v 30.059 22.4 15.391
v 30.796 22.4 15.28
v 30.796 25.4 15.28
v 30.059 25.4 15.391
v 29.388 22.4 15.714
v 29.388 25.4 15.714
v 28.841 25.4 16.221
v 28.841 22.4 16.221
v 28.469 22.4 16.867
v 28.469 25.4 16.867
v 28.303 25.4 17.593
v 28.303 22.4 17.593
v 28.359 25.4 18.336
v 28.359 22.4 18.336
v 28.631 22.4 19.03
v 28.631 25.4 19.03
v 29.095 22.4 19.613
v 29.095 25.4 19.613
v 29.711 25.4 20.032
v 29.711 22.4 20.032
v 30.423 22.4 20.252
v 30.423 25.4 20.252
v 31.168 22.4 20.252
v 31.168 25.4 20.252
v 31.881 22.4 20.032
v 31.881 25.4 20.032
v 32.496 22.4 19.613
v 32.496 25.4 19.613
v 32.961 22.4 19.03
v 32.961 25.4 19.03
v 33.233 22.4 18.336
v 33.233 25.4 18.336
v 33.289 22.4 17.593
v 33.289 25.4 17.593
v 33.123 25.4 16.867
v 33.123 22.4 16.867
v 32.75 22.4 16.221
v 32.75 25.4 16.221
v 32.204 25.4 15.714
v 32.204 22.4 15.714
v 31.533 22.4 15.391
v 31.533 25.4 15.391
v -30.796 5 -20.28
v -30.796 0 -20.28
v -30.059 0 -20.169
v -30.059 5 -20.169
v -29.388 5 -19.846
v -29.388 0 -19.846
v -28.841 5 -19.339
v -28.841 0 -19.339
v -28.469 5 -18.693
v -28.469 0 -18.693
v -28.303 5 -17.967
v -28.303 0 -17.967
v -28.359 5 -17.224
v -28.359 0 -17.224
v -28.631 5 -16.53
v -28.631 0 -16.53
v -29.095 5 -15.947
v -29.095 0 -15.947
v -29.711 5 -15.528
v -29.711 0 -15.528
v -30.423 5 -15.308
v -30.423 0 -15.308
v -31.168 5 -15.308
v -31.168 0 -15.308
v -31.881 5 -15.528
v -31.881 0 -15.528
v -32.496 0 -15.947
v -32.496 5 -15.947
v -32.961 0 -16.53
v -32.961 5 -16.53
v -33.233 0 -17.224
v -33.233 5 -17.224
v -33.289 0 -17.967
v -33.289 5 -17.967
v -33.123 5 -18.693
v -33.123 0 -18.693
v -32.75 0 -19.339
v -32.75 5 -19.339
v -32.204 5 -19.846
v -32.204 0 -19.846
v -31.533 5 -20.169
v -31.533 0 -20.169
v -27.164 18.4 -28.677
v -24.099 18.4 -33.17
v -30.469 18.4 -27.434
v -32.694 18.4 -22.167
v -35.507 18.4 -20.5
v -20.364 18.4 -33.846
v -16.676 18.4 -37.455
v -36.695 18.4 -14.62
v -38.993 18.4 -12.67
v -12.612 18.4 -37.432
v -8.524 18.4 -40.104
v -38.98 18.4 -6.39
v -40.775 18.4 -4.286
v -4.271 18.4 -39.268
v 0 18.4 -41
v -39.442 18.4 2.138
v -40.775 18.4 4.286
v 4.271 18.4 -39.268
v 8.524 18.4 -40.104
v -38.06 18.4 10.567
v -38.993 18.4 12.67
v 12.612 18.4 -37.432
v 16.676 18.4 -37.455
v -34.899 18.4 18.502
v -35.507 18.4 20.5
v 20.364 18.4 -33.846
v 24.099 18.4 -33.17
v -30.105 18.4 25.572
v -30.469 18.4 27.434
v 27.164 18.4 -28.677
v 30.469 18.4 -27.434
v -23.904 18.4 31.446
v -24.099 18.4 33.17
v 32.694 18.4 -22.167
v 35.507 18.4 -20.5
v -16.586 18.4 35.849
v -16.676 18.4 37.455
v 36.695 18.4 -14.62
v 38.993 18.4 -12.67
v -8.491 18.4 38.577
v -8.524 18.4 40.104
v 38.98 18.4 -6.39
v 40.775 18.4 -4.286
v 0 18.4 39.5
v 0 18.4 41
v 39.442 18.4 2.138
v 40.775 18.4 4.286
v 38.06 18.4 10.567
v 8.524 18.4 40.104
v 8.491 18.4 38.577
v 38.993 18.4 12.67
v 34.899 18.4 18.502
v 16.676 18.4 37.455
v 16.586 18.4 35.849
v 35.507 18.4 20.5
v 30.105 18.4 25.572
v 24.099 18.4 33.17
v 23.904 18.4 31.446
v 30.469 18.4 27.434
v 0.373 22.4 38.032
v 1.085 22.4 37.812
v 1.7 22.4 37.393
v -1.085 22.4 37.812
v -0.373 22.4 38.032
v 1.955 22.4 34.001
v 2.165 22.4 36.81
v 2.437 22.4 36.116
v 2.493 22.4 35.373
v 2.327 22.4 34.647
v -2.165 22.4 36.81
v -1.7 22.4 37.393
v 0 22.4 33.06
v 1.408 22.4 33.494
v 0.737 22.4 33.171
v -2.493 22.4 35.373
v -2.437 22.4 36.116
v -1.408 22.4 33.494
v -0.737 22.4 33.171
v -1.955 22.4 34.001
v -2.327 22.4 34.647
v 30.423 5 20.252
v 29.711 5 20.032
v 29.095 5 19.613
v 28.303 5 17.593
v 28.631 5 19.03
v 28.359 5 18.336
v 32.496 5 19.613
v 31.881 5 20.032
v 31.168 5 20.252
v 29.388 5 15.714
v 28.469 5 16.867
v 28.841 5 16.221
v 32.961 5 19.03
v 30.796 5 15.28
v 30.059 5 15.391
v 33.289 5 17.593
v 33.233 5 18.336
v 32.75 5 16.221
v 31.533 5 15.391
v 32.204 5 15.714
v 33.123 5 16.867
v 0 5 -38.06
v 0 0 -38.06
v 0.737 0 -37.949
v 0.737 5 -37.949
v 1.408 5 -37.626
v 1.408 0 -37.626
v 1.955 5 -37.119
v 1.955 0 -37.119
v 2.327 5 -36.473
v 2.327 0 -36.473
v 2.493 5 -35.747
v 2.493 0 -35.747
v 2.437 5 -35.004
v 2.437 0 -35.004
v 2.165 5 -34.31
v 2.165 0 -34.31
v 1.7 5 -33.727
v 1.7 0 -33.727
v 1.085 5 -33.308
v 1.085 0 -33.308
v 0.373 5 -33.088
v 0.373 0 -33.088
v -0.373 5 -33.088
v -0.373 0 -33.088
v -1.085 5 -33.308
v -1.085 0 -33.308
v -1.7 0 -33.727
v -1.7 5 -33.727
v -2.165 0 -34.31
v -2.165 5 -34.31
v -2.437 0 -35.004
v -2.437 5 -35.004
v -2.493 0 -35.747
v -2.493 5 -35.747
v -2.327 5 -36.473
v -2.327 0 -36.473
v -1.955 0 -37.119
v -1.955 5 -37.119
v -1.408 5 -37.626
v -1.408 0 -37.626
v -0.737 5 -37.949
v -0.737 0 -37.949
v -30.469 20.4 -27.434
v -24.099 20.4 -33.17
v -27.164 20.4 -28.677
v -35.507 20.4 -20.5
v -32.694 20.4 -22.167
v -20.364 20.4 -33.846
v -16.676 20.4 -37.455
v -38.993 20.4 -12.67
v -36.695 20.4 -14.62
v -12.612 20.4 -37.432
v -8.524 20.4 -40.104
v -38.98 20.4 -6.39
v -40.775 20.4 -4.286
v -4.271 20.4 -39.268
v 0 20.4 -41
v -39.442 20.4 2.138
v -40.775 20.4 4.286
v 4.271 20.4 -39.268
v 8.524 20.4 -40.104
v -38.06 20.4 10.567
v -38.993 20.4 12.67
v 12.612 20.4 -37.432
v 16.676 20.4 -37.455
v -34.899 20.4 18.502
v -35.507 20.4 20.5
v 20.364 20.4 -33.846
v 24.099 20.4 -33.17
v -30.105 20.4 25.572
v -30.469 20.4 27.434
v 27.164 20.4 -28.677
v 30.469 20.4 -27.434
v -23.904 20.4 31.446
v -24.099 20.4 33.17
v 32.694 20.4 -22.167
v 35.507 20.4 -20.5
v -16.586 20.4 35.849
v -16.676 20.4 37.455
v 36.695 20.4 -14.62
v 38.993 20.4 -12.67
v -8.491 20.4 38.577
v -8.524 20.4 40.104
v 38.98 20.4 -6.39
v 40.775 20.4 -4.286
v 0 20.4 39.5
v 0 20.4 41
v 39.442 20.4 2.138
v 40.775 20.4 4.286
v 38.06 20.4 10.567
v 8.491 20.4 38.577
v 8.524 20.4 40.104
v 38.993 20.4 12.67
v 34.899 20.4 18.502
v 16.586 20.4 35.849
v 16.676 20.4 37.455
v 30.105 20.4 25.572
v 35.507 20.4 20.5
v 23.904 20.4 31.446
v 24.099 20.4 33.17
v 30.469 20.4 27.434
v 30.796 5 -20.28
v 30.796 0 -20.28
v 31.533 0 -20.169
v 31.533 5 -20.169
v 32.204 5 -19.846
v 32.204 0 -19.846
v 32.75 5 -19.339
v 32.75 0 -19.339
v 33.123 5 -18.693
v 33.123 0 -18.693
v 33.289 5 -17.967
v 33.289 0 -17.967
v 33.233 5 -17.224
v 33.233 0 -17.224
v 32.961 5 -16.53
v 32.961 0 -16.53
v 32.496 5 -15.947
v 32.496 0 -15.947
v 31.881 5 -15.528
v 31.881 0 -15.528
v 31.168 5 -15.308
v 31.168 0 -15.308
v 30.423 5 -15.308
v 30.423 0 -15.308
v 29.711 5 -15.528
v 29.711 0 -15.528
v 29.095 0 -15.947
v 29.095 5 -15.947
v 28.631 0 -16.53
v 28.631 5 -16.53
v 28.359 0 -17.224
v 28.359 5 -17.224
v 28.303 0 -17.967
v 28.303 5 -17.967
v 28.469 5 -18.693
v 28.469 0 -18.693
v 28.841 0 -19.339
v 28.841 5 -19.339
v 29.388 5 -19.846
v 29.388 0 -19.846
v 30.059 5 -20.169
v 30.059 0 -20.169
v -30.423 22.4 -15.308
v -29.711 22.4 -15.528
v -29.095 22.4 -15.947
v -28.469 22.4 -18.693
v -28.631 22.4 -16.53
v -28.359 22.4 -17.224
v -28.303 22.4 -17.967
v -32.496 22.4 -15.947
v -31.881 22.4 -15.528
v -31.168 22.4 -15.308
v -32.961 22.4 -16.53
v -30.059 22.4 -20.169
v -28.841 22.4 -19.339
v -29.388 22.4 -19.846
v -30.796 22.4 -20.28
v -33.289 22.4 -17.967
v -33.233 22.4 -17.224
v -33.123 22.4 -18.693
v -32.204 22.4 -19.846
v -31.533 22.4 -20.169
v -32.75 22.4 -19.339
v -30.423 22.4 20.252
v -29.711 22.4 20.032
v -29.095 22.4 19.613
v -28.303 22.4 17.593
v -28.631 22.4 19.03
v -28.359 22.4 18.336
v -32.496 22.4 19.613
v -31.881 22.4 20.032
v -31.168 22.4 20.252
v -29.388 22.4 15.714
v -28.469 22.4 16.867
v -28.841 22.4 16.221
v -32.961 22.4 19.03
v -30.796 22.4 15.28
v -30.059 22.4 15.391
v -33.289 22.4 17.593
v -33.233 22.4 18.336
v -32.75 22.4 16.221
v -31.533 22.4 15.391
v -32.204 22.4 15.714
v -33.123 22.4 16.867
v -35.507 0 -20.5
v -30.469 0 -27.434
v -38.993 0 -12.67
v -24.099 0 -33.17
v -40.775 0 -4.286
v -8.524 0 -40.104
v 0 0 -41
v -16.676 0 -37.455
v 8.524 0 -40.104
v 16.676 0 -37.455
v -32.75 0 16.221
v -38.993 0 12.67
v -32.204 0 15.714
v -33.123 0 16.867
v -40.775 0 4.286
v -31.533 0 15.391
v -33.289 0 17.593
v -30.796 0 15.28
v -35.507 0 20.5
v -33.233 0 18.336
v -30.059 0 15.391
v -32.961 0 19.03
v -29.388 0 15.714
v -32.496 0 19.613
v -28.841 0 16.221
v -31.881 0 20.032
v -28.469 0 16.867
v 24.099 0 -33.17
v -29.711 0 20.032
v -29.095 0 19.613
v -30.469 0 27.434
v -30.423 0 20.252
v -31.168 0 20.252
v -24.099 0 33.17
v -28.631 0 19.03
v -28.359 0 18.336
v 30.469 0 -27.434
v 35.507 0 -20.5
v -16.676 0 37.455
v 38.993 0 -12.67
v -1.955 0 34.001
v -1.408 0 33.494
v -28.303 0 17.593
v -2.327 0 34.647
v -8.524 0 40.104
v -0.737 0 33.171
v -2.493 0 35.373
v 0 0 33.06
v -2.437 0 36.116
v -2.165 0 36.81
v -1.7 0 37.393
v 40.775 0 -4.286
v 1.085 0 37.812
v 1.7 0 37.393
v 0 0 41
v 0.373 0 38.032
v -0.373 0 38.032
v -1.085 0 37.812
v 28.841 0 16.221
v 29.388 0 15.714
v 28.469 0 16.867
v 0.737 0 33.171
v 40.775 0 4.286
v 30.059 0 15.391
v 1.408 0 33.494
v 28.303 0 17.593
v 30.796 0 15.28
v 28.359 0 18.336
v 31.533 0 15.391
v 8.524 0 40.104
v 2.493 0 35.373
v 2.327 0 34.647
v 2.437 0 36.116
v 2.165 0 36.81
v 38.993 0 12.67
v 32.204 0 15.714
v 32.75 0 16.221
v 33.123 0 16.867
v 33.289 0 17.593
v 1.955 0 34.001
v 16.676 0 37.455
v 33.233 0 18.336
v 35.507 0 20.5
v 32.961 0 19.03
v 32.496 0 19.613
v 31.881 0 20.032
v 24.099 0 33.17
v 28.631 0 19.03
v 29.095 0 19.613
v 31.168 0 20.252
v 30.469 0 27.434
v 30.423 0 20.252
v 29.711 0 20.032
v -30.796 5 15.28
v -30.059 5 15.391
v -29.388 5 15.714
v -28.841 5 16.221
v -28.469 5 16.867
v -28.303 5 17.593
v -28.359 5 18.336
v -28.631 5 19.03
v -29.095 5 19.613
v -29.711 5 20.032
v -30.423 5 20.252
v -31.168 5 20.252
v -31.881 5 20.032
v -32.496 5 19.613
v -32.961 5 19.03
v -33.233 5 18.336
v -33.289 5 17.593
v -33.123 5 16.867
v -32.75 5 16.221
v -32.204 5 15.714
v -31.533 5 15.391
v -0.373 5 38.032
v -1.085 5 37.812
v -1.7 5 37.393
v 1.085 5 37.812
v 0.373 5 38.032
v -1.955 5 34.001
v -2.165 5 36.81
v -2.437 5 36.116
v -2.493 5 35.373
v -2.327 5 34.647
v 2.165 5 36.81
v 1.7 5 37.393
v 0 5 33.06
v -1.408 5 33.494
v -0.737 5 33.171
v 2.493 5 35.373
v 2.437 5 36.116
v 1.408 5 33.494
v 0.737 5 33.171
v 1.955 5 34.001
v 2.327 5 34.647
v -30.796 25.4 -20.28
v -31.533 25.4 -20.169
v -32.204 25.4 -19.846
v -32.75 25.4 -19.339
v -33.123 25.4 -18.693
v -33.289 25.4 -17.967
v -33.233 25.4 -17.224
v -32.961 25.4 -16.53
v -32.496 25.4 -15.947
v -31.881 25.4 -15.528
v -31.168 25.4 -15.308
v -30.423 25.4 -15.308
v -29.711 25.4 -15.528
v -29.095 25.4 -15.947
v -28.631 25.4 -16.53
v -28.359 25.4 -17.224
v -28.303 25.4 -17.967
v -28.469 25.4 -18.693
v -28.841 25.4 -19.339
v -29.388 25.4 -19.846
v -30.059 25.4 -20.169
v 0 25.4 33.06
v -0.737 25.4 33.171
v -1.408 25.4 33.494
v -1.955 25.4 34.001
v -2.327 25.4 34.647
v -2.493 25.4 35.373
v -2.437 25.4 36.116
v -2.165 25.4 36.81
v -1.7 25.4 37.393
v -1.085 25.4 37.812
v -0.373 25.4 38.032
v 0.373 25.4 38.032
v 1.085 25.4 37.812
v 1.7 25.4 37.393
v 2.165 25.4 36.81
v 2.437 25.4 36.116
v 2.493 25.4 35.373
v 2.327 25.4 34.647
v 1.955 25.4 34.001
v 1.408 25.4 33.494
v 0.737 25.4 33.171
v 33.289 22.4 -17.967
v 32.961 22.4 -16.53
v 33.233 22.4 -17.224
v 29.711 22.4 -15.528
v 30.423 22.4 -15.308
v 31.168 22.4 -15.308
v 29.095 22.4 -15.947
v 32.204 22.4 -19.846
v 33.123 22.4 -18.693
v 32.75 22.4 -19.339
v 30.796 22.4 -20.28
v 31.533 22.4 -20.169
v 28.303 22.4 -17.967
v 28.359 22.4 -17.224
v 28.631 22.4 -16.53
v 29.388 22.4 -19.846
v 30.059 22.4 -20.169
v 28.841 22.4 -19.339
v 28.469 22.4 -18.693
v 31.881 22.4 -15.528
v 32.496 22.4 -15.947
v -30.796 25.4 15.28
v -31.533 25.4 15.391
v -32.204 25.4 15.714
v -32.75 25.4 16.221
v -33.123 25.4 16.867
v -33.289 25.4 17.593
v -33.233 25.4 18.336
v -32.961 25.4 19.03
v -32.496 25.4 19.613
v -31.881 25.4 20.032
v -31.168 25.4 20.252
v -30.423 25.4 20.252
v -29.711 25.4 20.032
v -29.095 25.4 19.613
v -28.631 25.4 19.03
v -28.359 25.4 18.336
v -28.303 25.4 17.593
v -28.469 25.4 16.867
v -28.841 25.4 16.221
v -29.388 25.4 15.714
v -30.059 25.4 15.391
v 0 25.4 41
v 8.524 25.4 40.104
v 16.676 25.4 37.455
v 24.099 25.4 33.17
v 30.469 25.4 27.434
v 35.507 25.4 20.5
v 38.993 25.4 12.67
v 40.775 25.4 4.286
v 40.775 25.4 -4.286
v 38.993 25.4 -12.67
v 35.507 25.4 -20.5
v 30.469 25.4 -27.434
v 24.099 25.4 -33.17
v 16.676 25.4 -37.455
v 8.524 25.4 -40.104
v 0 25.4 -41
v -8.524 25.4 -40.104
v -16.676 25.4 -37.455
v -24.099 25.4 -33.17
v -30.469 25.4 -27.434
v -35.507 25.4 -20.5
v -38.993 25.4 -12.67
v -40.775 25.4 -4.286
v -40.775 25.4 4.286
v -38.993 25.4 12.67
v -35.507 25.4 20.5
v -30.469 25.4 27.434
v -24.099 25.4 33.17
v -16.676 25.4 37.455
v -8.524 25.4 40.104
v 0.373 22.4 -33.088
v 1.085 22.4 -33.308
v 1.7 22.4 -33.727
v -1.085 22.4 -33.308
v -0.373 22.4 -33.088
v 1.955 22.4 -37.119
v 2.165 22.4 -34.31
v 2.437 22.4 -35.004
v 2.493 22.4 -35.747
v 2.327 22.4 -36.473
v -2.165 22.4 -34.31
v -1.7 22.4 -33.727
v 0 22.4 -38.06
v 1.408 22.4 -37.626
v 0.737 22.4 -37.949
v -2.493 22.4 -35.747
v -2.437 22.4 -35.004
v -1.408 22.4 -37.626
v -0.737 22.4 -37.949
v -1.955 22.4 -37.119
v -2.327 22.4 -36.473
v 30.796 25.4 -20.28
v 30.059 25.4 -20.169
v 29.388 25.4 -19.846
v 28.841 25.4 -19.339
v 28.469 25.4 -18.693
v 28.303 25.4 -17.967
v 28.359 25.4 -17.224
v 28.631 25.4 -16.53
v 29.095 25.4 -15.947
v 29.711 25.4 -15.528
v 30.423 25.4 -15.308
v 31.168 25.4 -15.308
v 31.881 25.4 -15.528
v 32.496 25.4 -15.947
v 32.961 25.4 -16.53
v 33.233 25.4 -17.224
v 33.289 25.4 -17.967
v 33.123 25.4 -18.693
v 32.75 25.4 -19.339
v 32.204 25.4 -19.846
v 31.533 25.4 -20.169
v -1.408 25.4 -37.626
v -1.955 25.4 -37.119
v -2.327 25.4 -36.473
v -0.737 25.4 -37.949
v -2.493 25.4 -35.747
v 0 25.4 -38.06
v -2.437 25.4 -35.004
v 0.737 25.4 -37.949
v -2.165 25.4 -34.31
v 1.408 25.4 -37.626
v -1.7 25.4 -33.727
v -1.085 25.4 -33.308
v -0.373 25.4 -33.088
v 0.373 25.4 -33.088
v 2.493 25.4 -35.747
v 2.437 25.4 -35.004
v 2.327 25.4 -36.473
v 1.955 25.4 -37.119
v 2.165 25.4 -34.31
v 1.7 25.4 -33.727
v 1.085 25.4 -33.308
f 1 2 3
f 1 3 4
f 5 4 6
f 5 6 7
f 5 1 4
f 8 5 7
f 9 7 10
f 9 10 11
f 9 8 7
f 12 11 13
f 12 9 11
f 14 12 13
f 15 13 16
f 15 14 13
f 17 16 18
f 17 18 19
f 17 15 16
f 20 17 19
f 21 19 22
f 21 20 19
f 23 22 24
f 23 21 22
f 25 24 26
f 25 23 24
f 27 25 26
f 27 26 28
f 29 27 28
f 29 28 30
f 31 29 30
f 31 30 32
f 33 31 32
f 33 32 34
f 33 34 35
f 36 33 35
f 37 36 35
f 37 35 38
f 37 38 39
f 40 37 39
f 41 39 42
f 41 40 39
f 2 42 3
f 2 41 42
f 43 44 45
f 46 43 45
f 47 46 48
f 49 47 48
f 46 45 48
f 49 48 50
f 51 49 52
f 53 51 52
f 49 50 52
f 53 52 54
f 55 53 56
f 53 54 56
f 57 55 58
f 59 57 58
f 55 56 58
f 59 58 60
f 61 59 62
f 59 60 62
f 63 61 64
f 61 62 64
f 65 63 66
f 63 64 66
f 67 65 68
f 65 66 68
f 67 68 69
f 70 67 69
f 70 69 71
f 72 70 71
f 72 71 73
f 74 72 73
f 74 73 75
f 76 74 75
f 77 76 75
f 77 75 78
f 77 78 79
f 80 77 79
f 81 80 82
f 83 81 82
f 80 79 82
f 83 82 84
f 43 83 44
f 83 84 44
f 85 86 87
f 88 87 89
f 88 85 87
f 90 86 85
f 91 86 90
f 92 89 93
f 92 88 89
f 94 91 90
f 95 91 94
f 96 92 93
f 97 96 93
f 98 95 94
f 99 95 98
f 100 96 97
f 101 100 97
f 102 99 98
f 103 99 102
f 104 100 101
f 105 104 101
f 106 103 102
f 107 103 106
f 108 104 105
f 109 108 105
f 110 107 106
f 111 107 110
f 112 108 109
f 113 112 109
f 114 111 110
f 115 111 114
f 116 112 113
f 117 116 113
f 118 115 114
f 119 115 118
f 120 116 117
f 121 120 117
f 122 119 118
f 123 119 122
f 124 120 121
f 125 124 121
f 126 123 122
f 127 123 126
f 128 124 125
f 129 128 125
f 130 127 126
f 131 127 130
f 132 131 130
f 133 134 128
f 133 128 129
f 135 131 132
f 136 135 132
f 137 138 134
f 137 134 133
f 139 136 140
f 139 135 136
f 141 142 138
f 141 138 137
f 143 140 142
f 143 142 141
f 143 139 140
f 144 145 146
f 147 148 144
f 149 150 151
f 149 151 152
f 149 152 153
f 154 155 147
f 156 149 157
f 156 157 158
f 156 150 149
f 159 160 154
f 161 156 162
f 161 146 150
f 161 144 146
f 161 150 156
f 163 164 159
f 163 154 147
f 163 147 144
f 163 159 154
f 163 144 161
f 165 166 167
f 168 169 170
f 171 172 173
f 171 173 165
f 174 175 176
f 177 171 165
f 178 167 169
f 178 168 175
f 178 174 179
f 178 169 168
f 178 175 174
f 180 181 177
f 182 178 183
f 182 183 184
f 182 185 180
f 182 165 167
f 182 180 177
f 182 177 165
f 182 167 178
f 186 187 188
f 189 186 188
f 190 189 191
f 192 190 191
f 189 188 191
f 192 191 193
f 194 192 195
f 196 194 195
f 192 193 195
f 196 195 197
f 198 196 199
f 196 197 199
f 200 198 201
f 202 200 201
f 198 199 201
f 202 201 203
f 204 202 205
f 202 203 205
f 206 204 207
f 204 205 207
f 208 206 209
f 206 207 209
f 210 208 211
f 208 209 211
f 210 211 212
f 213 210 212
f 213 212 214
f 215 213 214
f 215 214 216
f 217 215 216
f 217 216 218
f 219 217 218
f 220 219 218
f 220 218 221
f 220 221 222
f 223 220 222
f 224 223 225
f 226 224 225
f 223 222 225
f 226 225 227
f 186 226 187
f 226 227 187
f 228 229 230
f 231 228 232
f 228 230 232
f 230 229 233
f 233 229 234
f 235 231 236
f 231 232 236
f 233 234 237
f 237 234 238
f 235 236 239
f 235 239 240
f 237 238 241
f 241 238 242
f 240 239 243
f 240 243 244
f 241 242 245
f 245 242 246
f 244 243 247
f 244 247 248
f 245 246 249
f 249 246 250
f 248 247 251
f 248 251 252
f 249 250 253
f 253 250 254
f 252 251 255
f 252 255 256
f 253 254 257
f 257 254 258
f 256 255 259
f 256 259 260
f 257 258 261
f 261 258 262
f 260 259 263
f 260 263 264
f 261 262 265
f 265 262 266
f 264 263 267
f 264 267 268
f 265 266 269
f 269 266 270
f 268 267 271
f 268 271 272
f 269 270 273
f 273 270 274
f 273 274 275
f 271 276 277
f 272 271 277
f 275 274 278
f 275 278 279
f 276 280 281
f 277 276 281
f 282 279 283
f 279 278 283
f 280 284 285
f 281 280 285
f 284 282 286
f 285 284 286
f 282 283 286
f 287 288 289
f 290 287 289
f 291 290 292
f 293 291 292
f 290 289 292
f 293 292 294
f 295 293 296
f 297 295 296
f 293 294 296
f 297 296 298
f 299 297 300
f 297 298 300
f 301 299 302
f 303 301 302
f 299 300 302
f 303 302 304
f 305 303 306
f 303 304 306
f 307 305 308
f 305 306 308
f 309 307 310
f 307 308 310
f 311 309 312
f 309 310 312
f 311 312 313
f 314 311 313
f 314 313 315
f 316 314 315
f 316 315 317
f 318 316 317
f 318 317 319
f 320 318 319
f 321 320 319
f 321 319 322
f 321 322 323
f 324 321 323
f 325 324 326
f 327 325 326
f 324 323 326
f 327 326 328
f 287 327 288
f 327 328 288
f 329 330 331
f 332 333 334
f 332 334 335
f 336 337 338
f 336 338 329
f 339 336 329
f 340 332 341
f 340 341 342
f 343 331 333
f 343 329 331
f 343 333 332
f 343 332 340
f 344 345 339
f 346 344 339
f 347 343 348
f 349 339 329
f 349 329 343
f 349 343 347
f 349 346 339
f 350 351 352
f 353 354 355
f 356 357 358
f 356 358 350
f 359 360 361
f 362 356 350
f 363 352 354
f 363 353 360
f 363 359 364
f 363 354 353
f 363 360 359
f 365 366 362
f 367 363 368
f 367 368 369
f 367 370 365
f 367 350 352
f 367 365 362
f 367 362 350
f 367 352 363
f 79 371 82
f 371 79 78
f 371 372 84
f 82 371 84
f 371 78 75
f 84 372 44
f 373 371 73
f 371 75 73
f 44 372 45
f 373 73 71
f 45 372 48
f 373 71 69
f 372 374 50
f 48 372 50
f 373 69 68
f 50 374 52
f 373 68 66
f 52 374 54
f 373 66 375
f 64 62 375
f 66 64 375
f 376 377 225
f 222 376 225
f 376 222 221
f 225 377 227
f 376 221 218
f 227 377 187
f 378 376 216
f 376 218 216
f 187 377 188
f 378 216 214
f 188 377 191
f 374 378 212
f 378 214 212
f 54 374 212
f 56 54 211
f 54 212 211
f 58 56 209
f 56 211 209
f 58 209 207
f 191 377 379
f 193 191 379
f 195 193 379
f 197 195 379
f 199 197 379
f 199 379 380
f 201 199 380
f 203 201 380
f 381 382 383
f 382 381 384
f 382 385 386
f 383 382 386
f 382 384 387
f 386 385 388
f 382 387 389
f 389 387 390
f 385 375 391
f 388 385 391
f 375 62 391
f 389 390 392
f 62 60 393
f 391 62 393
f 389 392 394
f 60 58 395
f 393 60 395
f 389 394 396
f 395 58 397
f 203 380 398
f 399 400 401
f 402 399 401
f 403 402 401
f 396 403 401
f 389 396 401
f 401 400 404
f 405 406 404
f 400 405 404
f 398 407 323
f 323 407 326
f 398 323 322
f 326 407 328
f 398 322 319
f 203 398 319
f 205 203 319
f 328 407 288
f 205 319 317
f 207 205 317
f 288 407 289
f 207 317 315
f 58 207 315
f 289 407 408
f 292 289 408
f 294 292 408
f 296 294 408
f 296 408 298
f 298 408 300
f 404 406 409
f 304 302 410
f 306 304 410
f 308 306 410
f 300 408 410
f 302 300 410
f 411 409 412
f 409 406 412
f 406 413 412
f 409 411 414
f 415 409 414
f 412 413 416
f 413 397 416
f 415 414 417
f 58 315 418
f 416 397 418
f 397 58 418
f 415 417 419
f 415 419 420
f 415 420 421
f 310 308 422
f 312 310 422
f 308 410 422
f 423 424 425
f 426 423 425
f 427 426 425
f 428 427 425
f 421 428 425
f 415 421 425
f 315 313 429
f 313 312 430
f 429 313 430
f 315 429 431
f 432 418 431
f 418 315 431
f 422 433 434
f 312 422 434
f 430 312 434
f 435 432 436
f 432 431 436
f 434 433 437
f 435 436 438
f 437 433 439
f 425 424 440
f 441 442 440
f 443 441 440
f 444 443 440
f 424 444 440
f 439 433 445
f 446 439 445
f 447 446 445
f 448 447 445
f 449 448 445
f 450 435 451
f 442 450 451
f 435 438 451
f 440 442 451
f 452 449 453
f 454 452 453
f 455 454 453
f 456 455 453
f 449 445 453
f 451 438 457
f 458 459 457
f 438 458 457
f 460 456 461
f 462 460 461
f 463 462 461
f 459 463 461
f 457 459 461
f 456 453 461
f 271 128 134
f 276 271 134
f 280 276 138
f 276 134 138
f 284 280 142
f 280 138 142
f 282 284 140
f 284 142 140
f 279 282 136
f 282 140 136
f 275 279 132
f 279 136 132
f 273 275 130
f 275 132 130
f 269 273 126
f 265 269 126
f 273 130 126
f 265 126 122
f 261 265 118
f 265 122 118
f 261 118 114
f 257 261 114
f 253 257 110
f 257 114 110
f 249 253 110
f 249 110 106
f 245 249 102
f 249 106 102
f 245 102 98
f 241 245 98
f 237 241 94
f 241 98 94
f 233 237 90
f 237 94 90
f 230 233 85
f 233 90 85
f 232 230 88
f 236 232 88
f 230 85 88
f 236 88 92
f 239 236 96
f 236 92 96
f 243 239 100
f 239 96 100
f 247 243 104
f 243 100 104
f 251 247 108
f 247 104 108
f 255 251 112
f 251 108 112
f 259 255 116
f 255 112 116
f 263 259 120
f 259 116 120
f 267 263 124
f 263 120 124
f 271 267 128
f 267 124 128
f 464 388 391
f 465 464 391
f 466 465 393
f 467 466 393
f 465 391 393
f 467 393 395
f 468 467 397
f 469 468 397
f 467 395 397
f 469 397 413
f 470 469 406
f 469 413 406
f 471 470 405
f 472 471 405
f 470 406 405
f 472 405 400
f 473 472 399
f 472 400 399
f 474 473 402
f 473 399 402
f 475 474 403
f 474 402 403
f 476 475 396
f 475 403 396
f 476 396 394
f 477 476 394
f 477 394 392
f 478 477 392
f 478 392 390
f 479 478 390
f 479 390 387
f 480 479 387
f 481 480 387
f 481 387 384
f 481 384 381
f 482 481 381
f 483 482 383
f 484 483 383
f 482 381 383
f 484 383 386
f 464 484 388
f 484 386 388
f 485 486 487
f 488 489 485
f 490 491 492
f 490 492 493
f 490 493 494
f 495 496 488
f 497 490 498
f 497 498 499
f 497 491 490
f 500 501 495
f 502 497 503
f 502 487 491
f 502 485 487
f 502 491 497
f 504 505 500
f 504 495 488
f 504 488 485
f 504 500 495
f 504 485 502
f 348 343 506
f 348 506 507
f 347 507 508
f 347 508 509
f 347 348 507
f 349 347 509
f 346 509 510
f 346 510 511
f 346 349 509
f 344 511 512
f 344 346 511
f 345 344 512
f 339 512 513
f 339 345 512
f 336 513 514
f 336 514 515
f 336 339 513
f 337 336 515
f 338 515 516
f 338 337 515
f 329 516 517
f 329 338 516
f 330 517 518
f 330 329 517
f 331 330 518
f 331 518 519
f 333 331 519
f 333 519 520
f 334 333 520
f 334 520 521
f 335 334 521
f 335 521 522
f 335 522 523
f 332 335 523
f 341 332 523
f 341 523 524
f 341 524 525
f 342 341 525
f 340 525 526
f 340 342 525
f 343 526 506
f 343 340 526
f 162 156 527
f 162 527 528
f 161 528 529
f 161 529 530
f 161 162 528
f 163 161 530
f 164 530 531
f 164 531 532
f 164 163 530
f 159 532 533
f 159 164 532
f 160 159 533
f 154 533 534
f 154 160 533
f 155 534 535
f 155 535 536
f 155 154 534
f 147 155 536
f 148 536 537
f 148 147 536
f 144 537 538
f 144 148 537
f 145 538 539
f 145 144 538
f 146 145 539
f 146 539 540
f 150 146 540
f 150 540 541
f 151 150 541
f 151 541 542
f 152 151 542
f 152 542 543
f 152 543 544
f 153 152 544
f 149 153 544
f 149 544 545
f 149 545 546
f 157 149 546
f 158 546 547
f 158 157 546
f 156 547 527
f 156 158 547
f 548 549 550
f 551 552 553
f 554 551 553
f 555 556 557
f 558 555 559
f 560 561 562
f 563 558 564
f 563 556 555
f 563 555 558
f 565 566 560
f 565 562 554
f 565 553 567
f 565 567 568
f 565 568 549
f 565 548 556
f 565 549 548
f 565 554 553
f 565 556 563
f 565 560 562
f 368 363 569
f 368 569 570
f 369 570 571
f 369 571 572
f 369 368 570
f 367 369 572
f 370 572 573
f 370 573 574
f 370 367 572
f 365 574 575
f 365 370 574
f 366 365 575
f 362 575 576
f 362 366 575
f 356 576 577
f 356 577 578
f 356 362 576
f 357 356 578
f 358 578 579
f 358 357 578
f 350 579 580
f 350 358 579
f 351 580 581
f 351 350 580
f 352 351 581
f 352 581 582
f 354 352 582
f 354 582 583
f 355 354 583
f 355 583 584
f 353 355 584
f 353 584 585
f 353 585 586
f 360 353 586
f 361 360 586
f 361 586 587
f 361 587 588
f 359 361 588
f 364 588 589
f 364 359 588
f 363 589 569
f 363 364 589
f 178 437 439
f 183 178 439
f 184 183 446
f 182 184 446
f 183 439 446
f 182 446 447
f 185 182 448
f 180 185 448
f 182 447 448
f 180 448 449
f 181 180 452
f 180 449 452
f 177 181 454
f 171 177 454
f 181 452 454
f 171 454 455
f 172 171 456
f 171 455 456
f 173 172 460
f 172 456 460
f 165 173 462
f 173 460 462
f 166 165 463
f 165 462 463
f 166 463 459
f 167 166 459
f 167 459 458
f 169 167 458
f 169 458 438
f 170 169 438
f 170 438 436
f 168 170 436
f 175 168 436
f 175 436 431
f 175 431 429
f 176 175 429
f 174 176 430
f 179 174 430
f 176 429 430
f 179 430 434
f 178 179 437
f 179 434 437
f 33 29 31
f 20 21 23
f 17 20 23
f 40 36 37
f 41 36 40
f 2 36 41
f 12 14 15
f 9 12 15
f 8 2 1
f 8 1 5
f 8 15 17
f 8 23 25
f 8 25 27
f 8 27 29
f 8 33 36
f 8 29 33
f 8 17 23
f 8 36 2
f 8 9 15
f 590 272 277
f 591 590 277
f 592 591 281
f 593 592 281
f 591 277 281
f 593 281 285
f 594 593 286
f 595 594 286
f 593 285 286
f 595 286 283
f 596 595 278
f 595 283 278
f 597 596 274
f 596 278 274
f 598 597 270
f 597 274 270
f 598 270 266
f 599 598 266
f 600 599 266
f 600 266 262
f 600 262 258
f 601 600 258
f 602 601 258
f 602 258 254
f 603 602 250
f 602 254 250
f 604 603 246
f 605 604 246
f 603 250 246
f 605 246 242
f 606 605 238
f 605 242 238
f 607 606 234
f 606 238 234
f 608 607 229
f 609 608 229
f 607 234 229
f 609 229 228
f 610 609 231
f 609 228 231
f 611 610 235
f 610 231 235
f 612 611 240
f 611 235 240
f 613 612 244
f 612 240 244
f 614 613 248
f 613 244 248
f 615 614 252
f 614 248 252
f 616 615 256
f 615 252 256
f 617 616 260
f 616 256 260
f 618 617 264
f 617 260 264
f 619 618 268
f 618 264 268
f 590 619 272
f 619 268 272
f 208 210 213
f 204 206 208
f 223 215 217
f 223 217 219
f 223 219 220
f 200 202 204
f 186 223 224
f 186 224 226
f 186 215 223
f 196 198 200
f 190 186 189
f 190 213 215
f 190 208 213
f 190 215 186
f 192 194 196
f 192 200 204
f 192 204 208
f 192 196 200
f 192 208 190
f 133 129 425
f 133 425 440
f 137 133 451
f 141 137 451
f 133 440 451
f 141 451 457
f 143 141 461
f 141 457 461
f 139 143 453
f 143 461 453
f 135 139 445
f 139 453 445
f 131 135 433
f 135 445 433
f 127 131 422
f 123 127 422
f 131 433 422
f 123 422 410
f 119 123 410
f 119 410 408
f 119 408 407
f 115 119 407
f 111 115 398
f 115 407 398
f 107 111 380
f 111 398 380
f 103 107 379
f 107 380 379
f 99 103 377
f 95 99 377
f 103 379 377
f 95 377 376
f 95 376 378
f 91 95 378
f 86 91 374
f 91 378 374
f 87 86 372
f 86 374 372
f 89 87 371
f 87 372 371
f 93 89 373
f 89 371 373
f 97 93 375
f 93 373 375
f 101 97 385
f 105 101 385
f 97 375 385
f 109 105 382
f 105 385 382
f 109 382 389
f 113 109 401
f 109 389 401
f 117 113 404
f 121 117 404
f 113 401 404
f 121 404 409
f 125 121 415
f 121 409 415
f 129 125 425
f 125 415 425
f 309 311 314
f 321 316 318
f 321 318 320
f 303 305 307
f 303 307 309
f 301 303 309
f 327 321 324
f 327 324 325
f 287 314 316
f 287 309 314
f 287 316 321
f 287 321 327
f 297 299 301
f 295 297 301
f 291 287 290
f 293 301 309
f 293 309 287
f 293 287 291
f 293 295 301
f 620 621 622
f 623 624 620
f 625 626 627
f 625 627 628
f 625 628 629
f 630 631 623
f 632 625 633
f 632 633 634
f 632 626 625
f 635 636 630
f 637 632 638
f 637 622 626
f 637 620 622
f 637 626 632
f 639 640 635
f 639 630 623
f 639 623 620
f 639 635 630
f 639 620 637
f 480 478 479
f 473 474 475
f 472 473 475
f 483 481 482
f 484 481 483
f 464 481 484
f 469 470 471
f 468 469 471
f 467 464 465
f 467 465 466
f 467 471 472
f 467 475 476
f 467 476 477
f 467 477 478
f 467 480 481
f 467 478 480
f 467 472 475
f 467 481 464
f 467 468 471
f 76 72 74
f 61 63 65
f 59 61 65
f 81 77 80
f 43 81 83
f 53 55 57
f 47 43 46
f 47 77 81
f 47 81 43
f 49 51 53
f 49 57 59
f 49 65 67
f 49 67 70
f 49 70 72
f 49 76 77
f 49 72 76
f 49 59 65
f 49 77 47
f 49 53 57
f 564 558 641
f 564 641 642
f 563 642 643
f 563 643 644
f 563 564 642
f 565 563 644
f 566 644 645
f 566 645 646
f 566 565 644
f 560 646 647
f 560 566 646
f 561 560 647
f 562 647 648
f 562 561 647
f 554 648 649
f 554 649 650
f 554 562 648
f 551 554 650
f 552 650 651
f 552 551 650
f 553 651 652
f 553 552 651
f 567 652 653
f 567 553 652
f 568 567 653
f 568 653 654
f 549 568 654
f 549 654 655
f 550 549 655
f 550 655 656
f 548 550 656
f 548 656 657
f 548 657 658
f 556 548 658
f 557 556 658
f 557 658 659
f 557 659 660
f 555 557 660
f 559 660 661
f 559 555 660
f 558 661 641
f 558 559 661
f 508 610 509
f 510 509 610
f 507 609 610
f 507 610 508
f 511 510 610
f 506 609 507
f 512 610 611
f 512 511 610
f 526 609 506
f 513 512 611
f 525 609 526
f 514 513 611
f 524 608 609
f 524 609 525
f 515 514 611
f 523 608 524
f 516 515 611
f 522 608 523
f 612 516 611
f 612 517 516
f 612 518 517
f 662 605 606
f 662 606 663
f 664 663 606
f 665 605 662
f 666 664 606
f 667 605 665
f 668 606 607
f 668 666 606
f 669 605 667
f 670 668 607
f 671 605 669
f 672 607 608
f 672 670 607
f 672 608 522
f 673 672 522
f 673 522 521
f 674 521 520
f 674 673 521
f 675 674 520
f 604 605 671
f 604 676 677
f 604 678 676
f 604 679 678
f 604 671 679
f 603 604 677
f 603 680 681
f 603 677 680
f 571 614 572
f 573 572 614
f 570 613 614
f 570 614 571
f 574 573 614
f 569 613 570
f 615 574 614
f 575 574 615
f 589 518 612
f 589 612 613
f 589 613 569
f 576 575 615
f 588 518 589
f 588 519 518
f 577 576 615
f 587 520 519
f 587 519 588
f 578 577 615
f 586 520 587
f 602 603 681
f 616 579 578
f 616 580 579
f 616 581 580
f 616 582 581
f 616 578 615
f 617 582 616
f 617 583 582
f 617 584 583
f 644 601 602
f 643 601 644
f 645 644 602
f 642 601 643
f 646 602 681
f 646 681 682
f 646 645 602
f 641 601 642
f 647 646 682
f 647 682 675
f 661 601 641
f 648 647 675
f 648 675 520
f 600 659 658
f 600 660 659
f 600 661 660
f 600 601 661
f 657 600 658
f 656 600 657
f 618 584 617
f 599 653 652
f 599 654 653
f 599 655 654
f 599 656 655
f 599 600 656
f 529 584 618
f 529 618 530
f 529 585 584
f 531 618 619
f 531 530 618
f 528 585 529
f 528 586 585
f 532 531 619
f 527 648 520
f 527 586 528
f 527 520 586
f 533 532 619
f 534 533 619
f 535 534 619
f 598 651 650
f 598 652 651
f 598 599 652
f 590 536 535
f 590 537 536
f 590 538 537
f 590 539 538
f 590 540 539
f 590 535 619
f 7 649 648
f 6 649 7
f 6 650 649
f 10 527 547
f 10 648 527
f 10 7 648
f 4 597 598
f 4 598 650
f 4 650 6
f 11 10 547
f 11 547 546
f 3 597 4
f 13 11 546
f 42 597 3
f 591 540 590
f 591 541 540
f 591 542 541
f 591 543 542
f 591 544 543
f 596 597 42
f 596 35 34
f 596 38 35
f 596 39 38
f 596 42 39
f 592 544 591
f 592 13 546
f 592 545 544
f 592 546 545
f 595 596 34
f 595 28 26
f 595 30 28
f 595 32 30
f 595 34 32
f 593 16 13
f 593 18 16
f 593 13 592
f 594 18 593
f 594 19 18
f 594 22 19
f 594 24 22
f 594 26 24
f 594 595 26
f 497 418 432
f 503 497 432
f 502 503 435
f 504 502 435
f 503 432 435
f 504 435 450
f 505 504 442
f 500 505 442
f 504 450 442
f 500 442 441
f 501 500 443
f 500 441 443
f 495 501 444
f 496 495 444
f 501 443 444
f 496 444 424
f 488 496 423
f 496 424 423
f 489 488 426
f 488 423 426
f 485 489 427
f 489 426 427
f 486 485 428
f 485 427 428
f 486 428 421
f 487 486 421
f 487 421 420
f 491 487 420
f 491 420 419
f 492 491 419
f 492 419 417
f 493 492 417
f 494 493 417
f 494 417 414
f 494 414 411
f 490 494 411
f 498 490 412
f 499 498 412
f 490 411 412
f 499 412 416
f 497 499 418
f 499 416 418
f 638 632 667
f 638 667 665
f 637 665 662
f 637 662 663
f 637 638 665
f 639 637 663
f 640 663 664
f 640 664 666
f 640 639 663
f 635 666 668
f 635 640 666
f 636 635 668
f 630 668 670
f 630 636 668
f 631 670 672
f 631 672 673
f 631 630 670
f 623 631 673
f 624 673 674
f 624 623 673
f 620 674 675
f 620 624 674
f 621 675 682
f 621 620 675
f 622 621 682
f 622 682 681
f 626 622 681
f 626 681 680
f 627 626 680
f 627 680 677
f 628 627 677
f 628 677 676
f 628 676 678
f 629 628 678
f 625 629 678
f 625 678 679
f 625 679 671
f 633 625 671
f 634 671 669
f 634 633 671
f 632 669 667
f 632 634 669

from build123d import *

# Parameters (mm, degrees)
SKETCH1_R           = 41
BOSS_EXTRUDE1_DEPTH = 18.4
SKETCH2_R           = 39.5
BOSS_EXTRUDE2_DEPTH = 2
SKETCH3_R           = 41
BOSS_EXTRUDE3_DEPTH = 5
SKETCH4_R           = 2.5
CUT_EXTRUDE1_DEPTH  = 5
CUT_EXTRUDE2_START  = -3
SKETCH5_R           = 2.5
CUT_EXTRUDE2_DEPTH  = 3


with BuildPart() as part:
    # Sketch1 → Boss-Extrude1 (new body)
    with BuildSketch(Plane(origin=(0, 0, 0), x_dir=(1, 0, 0), z_dir=(0, 1, 0))):
        with Locations(Location((0, 0, 0), (0, 0, 270))):
            Circle(SKETCH1_R)
    extrude(amount=BOSS_EXTRUDE1_DEPTH)

    # Sketch2 → Boss-Extrude2 (add)
    with BuildSketch(Plane(origin=(0, 18.4, 0), x_dir=(1, 0, 0), z_dir=(0, 1, 0))):
        with Locations(Location((0, 0, 0), (0, 0, 270))):
            Circle(SKETCH2_R)
    extrude(amount=BOSS_EXTRUDE2_DEPTH)

    # Sketch3 → Boss-Extrude3 (add)
    with BuildSketch(Plane(origin=(0, 20.4, 0), x_dir=(1, 0, 0), z_dir=(0, 1, 0))):
        with Locations(Location((0, 0, 0), (0, 0, 270))):
            Circle(SKETCH3_R)
    extrude(amount=BOSS_EXTRUDE3_DEPTH)

    # Sketch4 → Cut-Extrude1 (cut)
    with BuildSketch(Plane.XZ):
        with Locations(Location((30.795863359, 17.78, 0), (0, 0, 270))):
            Circle(SKETCH4_R)
        with Locations(Location((30.795863359, -17.78, 0), (0, 0, 270))):
            Circle(SKETCH4_R)
        with Locations(Location((0, -35.56, 0), (0, 0, 270))):
            Circle(SKETCH4_R)
        with Locations(Location((-30.795863359, -17.78, 0), (0, 0, 270))):
            Circle(SKETCH4_R)
        with Locations(Location((-30.795863359, 17.78, 0), (0, 0, 270))):
            Circle(SKETCH4_R)
        with Locations(Location((0, 35.56, 0), (0, 0, 270))):
            Circle(SKETCH4_R)
    extrude(amount=-CUT_EXTRUDE1_DEPTH, mode=Mode.SUBTRACT)

    # Sketch5 → Cut-Extrude2 (cut)
    with BuildSketch(Plane(origin=(0, 25.4, 0), x_dir=(1, 0, 0), z_dir=(0, 1, 0)).offset(CUT_EXTRUDE2_START)):
        with Locations(Location((30.795863359, 17.78, 0), (0, 0, 90))):
            Circle(SKETCH5_R)
        with Locations(Location((30.795863359, -17.78, 0), (0, 0, 90))):
            Circle(SKETCH5_R)
        with Locations(Location((0, -35.56, 0), (0, 0, 90))):
            Circle(SKETCH5_R)
        with Locations(Location((-30.795863359, -17.78, 0), (0, 0, 90))):
            Circle(SKETCH5_R)
        with Locations(Location((-30.795863359, 17.78, 0), (0, 0, 90))):
            Circle(SKETCH5_R)
        with Locations(Location((0, 35.56, 0), (0, 0, 90))):
            Circle(SKETCH5_R)
    extrude(amount=CUT_EXTRUDE2_DEPTH, mode=Mode.SUBTRACT)


solid = part.part
